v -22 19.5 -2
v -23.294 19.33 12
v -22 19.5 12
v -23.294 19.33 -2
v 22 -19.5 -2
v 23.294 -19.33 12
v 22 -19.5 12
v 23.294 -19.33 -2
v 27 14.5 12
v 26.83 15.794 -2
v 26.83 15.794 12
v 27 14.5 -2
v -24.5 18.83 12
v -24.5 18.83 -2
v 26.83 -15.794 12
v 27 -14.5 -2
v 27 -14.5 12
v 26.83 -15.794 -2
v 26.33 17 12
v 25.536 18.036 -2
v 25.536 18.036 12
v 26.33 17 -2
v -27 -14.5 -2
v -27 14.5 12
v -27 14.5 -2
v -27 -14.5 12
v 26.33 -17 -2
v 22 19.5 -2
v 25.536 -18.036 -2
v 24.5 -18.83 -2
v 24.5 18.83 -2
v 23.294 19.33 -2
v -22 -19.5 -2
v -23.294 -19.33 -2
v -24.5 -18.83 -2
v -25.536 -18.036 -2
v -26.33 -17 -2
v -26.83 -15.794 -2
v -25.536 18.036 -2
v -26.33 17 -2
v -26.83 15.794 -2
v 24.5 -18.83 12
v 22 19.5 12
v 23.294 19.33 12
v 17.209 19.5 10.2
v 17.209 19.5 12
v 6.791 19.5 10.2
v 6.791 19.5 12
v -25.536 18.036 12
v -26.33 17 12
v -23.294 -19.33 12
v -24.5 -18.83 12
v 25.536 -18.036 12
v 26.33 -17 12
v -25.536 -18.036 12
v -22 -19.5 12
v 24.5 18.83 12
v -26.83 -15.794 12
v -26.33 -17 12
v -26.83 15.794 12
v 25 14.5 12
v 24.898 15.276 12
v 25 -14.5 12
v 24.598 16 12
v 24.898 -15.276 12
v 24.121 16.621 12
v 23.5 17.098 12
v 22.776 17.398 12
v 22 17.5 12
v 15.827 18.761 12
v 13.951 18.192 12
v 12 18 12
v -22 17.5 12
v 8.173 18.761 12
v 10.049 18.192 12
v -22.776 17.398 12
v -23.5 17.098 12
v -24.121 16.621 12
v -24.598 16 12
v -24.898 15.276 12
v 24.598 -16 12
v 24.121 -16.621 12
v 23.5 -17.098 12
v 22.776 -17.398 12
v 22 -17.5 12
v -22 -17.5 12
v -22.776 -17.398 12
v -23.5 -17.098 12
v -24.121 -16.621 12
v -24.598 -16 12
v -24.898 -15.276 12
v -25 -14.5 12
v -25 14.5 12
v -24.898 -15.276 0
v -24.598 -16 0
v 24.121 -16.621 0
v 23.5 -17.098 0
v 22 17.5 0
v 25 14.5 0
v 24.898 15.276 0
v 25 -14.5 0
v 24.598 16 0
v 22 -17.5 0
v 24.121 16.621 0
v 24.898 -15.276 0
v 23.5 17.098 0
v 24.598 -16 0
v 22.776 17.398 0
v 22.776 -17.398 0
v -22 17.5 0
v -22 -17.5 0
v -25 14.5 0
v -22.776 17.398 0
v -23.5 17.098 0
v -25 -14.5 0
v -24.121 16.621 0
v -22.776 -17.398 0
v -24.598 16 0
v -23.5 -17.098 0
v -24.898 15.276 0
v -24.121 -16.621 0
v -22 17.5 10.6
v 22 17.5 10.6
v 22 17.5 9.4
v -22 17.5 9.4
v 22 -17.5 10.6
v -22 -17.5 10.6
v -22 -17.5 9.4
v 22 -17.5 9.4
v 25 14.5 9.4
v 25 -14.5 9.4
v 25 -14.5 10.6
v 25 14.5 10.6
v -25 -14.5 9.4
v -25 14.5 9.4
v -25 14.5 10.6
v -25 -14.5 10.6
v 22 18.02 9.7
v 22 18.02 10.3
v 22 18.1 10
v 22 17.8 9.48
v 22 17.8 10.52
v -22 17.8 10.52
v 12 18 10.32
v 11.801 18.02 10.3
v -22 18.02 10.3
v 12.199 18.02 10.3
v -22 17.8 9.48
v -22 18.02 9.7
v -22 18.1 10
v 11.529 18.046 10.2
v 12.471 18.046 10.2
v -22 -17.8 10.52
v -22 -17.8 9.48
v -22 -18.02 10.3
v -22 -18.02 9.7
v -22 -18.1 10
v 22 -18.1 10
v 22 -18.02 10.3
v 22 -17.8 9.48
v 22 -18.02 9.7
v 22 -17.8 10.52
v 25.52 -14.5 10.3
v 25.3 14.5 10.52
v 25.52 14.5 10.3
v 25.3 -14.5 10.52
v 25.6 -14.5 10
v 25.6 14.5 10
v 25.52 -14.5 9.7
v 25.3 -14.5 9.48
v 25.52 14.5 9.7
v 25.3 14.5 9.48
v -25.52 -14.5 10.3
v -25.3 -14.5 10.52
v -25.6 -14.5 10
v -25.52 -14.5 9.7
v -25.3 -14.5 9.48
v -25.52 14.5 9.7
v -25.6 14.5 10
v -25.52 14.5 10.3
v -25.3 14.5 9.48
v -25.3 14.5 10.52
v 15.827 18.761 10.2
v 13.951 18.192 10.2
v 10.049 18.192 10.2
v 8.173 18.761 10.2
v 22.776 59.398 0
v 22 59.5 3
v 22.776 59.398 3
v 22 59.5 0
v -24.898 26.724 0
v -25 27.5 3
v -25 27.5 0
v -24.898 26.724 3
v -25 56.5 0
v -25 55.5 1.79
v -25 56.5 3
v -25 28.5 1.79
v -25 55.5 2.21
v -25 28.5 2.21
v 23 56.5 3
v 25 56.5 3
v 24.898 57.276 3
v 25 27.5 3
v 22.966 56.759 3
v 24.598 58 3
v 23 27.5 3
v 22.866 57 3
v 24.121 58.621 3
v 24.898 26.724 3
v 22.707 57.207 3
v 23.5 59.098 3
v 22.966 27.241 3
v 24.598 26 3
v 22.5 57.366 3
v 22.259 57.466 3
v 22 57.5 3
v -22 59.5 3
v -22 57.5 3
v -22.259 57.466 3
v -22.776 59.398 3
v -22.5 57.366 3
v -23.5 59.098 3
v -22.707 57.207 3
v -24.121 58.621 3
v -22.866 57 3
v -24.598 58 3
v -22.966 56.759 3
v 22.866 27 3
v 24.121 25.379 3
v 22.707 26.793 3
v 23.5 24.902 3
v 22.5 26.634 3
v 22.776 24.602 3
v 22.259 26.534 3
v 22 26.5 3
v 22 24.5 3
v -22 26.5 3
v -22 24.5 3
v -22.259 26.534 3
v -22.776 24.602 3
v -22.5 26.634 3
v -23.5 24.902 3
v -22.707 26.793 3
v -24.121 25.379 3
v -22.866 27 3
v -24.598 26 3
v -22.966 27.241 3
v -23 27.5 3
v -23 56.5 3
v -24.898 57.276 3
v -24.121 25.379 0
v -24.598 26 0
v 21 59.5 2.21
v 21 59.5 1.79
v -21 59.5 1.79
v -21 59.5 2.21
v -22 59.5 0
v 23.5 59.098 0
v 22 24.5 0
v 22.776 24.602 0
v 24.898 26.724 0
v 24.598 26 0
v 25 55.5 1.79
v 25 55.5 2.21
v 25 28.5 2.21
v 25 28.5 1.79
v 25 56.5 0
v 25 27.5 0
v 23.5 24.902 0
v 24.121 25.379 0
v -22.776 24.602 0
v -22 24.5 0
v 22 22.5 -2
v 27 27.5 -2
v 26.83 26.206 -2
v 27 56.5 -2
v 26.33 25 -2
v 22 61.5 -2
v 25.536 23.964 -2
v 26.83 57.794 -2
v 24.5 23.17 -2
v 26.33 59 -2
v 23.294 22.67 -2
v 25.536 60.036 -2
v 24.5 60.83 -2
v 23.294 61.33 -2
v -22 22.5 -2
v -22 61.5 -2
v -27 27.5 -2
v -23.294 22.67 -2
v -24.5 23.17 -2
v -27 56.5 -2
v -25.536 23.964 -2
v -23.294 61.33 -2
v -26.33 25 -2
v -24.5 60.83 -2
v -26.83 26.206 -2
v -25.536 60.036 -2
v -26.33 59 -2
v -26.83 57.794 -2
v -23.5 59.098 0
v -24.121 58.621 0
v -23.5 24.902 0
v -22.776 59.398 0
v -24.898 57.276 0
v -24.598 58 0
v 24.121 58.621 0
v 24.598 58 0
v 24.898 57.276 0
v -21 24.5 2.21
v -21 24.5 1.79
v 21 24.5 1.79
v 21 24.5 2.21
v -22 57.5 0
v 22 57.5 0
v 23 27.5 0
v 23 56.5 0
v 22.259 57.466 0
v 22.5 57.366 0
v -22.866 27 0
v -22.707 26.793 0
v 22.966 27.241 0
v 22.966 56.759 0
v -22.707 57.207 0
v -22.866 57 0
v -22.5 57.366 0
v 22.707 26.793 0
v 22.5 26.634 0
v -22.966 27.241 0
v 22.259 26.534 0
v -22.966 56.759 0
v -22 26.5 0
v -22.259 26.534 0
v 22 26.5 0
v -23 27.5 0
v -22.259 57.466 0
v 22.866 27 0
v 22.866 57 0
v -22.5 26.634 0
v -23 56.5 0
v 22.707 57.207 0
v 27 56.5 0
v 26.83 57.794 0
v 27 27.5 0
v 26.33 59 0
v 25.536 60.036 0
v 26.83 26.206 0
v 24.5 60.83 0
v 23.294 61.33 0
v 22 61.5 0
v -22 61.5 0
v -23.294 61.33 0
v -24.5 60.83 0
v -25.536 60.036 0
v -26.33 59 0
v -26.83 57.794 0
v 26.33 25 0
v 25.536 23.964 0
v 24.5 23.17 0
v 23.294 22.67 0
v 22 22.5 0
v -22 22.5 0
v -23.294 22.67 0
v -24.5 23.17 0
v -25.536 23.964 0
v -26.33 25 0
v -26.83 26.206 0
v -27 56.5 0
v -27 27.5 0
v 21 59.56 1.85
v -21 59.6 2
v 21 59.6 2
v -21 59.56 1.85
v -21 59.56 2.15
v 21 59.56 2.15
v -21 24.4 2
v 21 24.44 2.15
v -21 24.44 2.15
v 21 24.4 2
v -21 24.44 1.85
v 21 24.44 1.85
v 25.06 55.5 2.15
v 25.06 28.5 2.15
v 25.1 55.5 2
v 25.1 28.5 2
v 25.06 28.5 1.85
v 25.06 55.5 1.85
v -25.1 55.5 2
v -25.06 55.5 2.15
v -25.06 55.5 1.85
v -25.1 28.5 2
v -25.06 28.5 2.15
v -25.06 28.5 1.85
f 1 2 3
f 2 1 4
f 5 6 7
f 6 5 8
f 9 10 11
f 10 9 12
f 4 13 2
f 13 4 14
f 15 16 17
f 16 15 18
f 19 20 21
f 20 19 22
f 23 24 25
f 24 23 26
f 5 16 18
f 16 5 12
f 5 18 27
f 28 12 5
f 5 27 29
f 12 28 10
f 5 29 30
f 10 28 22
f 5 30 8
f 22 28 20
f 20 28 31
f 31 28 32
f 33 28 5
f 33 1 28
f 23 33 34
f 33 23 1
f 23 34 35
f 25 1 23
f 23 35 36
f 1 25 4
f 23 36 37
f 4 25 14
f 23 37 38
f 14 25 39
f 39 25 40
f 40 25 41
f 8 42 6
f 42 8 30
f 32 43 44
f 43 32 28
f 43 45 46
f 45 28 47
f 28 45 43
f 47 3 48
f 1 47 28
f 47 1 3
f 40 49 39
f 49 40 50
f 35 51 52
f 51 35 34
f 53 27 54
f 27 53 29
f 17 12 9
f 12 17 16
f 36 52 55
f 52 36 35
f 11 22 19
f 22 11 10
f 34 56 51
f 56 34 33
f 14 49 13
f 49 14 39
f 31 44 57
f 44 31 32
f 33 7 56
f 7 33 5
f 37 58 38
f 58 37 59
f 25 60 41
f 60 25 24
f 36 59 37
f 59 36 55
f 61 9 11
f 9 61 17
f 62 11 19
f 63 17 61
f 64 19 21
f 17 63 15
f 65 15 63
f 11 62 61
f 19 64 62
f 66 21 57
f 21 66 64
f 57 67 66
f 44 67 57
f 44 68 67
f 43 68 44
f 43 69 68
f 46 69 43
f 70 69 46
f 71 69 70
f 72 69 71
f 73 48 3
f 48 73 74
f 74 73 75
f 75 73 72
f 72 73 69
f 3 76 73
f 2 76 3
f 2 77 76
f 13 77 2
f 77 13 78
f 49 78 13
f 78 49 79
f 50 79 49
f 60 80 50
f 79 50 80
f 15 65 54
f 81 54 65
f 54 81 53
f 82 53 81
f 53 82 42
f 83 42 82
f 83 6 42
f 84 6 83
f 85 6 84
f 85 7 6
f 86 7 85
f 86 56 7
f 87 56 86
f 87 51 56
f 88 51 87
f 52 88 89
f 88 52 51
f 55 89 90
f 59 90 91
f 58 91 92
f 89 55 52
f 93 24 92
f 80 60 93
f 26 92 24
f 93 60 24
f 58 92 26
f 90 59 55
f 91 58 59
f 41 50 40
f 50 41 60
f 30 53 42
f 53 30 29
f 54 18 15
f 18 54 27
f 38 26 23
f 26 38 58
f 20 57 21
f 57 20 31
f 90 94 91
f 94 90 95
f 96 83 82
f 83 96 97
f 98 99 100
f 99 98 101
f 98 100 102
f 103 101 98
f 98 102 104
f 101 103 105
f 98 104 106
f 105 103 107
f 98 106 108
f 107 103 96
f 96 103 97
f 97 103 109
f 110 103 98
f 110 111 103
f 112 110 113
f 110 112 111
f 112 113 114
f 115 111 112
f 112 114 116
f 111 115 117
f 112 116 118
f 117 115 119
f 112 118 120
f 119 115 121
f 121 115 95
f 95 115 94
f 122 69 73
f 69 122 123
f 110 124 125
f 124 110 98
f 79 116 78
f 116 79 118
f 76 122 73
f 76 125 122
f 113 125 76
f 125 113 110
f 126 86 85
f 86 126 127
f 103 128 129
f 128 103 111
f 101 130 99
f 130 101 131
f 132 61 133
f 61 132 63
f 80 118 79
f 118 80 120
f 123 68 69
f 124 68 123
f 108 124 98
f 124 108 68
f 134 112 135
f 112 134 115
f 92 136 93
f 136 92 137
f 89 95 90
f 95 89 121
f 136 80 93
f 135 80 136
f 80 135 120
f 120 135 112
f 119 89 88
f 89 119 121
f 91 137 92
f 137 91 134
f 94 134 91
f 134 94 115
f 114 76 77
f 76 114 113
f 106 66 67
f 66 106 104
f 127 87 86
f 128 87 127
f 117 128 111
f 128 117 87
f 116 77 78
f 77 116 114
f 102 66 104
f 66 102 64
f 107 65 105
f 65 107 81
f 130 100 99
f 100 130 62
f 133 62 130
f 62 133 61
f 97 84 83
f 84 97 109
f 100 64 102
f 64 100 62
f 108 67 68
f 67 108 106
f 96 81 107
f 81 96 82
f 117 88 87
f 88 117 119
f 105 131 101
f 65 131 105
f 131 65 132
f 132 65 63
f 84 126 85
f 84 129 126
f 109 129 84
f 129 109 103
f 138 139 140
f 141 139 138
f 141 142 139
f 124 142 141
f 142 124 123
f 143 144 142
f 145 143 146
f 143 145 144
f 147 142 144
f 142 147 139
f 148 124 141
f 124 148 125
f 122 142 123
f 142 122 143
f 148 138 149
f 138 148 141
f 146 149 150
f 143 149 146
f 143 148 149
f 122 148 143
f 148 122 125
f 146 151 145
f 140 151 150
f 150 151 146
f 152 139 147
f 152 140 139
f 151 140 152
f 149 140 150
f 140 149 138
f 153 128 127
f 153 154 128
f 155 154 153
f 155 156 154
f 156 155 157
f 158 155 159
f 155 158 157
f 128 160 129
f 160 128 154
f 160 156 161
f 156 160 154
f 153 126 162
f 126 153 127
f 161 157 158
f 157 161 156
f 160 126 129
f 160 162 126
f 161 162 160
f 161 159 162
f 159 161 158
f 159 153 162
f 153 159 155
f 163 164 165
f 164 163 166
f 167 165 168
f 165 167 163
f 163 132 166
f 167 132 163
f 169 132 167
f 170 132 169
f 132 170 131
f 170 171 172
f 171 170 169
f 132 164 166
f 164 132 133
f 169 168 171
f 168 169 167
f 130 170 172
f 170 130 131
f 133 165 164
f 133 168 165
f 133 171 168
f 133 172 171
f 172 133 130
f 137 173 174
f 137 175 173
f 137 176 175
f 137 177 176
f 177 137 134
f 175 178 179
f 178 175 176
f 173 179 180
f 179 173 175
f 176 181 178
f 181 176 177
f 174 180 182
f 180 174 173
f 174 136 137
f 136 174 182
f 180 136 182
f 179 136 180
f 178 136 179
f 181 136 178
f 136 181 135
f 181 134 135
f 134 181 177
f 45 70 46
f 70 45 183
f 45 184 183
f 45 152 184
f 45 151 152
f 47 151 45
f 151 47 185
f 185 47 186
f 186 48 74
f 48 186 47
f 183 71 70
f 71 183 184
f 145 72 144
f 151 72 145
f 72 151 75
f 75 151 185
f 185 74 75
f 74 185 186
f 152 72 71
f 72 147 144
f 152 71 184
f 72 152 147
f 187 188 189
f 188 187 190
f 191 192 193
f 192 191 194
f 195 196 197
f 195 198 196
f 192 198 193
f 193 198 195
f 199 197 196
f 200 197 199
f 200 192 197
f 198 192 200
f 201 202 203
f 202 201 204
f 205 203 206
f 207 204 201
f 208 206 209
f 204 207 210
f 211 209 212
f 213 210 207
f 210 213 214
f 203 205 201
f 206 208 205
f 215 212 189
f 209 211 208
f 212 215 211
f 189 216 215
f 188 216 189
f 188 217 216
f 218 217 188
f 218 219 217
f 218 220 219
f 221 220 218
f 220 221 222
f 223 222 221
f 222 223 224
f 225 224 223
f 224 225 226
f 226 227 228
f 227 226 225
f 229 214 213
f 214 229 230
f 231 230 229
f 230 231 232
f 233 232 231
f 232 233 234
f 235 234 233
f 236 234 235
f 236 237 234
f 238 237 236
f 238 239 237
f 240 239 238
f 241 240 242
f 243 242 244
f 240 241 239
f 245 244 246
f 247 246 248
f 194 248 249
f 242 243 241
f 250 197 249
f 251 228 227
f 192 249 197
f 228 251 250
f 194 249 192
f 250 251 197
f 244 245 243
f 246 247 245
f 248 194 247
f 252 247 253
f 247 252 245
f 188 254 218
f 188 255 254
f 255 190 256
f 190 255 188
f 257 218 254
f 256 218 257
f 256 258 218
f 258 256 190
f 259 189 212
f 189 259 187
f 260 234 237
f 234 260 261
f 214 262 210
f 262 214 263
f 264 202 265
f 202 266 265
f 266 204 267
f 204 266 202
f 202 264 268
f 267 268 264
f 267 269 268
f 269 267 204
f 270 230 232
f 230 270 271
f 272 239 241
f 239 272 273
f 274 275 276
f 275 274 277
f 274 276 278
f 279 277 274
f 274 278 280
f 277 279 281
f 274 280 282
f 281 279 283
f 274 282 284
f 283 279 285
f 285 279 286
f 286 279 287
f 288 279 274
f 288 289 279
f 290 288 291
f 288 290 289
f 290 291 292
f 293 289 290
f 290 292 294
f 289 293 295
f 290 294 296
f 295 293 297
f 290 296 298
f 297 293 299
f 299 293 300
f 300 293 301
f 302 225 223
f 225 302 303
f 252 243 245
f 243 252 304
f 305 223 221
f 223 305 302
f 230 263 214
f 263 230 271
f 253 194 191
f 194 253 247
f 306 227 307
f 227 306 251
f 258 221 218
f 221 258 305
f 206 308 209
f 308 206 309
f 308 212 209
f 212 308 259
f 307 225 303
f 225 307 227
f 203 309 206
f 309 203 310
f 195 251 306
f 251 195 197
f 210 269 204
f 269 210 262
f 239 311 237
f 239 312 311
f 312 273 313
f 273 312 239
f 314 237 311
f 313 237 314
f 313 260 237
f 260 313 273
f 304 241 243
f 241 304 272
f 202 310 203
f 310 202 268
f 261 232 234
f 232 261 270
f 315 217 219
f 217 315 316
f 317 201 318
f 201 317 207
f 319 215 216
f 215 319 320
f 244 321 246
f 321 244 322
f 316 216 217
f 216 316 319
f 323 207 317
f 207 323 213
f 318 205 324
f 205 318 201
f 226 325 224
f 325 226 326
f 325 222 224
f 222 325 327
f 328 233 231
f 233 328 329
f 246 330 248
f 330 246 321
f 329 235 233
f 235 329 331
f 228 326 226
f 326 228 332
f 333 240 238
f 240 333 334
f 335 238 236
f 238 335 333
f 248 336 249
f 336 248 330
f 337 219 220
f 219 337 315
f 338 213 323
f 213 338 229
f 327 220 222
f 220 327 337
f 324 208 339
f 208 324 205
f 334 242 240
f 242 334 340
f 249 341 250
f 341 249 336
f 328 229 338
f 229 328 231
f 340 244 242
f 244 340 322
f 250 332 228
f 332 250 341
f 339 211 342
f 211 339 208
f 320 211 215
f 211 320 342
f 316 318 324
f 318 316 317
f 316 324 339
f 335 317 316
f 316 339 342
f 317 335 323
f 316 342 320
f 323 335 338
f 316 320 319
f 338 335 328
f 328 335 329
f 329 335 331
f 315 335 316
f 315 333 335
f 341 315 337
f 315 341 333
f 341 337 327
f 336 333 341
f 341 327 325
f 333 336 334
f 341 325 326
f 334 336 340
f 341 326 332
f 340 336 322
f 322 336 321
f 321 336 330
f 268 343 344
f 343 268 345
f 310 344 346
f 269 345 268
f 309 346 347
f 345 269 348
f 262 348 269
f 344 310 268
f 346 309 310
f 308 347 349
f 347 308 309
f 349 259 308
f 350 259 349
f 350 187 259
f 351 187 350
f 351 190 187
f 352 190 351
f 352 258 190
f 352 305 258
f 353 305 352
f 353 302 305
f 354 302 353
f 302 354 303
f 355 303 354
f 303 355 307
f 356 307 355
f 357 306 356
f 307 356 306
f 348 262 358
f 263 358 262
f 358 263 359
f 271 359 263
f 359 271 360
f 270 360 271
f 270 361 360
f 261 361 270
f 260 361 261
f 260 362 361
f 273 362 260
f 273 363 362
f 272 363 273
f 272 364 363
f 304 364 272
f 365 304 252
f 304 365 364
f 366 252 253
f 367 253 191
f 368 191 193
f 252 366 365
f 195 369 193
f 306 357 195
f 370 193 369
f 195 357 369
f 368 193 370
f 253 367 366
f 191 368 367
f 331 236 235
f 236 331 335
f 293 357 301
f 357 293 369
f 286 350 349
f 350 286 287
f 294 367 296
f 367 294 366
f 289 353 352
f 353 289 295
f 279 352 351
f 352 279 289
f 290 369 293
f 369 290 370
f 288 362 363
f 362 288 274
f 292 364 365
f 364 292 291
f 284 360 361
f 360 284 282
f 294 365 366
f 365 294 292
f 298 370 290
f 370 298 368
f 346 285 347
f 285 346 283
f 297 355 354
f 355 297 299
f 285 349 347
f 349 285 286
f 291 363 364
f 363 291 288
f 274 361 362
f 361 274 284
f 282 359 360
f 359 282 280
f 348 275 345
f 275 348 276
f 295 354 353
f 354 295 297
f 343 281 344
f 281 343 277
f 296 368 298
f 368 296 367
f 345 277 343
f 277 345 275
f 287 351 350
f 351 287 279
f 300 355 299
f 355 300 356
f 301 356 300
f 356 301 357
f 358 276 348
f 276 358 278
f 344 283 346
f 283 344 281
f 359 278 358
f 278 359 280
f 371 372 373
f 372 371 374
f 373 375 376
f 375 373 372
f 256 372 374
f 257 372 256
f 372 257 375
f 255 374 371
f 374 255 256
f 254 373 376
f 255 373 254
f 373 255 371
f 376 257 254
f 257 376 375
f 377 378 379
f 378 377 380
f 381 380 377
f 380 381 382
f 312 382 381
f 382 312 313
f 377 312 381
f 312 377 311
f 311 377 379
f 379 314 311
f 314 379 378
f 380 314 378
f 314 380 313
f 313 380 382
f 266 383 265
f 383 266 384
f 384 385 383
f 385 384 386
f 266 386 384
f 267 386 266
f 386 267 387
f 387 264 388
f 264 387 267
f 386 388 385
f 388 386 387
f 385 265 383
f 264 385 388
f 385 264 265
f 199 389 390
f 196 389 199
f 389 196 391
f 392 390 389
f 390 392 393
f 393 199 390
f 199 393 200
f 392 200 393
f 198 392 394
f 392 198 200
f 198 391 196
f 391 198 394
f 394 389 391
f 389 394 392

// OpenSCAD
// V 1.2 Correction / hint from molotok3D, some minor fixes
// V 1.1- added opening helper and an optional separating wall
$fn=300;
wi=50;	// inner width, length & heigth
li=35;
h=12;
th=2;	// wall thickness
r=3;	// radius of rounded corners
opening_help=true;	// make a gap to ease opening of the cover, f.ex.
		// with a coin - girls are afraid of their finger nails ;-)
separator=0;	// generate a separating wall inside - set to 0 for none

e=0.01;
ri=(r>th)?r-th:e;	// needed for the cover - needs to be larger than 0 for proper results
l=li-2*r;
w=wi-2*r;

module box(){
	difference(){
		translate([0,0,-th])hull(){
			for (i=[[-w/2,-l/2],[-w/2,l/2],[w/2,-l/2],[w/2,l/2]]){
				translate(i)cylinder(r=r+th,h=h+th,$fn=8*r);
			}
		}
		hull(){
			for (i=[[-w/2,-l/2],[-w/2,l/2,],[w/2,-l/2],[w/2,l/2]]){
				translate(i)cylinder(r=r,h=h,$fn=8*r);
			}
		}
		translate([-w/2,l/2+r,h-2])rotate([0,90,0])cylinder(d=1.2,h=w,$fn=12);
		translate([-w/2,-l/2-r,h-2])rotate([0,90,0])cylinder(d=1.2,h=w,$fn=12);
		translate([w/2+r,l/2,h-2])rotate([90,0,0])cylinder(d=1.2,h=l,$fn=12);
		translate([-w/2-r,l/2,h-2])rotate([90,0,0])cylinder(d=1.2,h=l,$fn=12);

		// if you need some adjustment for the opening helper size or position,
		// this is the right place
		if (opening_help)translate([w/2-10,l/2+13.5,h-1.8])cylinder(d=20,h=10,$fn=32);
	}
	if (separator>0){
		translate([separator-wi/2,-li/2-e,-e])difference(){
			cube([th,li+2*e,h]);
			translate([-e,-e,h-3])cube([th+2*e,2*th+2+2*e,5]);
			translate([-e,e+li-2*th-2,h-3])cube([th+2+2*e,2*th+2+2*e,5]);
		}
	}
}

module cover(){
	translate([0,0,-th])hull(){
		for (i=[[-w/2,-l/2],[-w/2,l/2],[w/2,-l/2],[w/2,l/2]]){
			translate(i)cylinder(r=r+th,h=th,$fn=8*r);
		}
	}
	difference(){
		translate([0,0,-th])hull(){
			for (i=[[-w/2,-l/2],[-w/2,l/2],[w/2,-l/2],[w/2,l/2]]){
				translate(i)cylinder(r=r,h=th+3,$fn=8*r);
			}
		}
		hull(){
			for (i=[[-w/2,-l/2],[-w/2,l/2],[w/2,-l/2],[w/2,l/2]]){
				if (r>th){
					translate(i)cylinder(r=r-th,h=3,$fn=8*r);
				}else{
					translate(i)cylinder(r=e,h=3,$fn=8*r);
				}
			}
		}
	}
	translate([-w/2+1,l/2+r-0.2,2])rotate([0,90,0])cylinder(d=0.6,h=w-2,$fn=12);
	translate([-w/2+1,-l/2-r+0.2,2])rotate([0,90,0])cylinder(d=0.6,h=w-2,$fn=12);
	translate([w/2+r-0.2,l/2-1,2])rotate([90,0,0])cylinder(d=0.6,h=l-2,$fn=12);
	translate([-w/2-r+0.2,l/2-1,2])rotate([90,0,0])cylinder(d=0.6,h=l-2,$fn=12);

}

box();
translate([0,li+3+2*th,0])
	cover();
